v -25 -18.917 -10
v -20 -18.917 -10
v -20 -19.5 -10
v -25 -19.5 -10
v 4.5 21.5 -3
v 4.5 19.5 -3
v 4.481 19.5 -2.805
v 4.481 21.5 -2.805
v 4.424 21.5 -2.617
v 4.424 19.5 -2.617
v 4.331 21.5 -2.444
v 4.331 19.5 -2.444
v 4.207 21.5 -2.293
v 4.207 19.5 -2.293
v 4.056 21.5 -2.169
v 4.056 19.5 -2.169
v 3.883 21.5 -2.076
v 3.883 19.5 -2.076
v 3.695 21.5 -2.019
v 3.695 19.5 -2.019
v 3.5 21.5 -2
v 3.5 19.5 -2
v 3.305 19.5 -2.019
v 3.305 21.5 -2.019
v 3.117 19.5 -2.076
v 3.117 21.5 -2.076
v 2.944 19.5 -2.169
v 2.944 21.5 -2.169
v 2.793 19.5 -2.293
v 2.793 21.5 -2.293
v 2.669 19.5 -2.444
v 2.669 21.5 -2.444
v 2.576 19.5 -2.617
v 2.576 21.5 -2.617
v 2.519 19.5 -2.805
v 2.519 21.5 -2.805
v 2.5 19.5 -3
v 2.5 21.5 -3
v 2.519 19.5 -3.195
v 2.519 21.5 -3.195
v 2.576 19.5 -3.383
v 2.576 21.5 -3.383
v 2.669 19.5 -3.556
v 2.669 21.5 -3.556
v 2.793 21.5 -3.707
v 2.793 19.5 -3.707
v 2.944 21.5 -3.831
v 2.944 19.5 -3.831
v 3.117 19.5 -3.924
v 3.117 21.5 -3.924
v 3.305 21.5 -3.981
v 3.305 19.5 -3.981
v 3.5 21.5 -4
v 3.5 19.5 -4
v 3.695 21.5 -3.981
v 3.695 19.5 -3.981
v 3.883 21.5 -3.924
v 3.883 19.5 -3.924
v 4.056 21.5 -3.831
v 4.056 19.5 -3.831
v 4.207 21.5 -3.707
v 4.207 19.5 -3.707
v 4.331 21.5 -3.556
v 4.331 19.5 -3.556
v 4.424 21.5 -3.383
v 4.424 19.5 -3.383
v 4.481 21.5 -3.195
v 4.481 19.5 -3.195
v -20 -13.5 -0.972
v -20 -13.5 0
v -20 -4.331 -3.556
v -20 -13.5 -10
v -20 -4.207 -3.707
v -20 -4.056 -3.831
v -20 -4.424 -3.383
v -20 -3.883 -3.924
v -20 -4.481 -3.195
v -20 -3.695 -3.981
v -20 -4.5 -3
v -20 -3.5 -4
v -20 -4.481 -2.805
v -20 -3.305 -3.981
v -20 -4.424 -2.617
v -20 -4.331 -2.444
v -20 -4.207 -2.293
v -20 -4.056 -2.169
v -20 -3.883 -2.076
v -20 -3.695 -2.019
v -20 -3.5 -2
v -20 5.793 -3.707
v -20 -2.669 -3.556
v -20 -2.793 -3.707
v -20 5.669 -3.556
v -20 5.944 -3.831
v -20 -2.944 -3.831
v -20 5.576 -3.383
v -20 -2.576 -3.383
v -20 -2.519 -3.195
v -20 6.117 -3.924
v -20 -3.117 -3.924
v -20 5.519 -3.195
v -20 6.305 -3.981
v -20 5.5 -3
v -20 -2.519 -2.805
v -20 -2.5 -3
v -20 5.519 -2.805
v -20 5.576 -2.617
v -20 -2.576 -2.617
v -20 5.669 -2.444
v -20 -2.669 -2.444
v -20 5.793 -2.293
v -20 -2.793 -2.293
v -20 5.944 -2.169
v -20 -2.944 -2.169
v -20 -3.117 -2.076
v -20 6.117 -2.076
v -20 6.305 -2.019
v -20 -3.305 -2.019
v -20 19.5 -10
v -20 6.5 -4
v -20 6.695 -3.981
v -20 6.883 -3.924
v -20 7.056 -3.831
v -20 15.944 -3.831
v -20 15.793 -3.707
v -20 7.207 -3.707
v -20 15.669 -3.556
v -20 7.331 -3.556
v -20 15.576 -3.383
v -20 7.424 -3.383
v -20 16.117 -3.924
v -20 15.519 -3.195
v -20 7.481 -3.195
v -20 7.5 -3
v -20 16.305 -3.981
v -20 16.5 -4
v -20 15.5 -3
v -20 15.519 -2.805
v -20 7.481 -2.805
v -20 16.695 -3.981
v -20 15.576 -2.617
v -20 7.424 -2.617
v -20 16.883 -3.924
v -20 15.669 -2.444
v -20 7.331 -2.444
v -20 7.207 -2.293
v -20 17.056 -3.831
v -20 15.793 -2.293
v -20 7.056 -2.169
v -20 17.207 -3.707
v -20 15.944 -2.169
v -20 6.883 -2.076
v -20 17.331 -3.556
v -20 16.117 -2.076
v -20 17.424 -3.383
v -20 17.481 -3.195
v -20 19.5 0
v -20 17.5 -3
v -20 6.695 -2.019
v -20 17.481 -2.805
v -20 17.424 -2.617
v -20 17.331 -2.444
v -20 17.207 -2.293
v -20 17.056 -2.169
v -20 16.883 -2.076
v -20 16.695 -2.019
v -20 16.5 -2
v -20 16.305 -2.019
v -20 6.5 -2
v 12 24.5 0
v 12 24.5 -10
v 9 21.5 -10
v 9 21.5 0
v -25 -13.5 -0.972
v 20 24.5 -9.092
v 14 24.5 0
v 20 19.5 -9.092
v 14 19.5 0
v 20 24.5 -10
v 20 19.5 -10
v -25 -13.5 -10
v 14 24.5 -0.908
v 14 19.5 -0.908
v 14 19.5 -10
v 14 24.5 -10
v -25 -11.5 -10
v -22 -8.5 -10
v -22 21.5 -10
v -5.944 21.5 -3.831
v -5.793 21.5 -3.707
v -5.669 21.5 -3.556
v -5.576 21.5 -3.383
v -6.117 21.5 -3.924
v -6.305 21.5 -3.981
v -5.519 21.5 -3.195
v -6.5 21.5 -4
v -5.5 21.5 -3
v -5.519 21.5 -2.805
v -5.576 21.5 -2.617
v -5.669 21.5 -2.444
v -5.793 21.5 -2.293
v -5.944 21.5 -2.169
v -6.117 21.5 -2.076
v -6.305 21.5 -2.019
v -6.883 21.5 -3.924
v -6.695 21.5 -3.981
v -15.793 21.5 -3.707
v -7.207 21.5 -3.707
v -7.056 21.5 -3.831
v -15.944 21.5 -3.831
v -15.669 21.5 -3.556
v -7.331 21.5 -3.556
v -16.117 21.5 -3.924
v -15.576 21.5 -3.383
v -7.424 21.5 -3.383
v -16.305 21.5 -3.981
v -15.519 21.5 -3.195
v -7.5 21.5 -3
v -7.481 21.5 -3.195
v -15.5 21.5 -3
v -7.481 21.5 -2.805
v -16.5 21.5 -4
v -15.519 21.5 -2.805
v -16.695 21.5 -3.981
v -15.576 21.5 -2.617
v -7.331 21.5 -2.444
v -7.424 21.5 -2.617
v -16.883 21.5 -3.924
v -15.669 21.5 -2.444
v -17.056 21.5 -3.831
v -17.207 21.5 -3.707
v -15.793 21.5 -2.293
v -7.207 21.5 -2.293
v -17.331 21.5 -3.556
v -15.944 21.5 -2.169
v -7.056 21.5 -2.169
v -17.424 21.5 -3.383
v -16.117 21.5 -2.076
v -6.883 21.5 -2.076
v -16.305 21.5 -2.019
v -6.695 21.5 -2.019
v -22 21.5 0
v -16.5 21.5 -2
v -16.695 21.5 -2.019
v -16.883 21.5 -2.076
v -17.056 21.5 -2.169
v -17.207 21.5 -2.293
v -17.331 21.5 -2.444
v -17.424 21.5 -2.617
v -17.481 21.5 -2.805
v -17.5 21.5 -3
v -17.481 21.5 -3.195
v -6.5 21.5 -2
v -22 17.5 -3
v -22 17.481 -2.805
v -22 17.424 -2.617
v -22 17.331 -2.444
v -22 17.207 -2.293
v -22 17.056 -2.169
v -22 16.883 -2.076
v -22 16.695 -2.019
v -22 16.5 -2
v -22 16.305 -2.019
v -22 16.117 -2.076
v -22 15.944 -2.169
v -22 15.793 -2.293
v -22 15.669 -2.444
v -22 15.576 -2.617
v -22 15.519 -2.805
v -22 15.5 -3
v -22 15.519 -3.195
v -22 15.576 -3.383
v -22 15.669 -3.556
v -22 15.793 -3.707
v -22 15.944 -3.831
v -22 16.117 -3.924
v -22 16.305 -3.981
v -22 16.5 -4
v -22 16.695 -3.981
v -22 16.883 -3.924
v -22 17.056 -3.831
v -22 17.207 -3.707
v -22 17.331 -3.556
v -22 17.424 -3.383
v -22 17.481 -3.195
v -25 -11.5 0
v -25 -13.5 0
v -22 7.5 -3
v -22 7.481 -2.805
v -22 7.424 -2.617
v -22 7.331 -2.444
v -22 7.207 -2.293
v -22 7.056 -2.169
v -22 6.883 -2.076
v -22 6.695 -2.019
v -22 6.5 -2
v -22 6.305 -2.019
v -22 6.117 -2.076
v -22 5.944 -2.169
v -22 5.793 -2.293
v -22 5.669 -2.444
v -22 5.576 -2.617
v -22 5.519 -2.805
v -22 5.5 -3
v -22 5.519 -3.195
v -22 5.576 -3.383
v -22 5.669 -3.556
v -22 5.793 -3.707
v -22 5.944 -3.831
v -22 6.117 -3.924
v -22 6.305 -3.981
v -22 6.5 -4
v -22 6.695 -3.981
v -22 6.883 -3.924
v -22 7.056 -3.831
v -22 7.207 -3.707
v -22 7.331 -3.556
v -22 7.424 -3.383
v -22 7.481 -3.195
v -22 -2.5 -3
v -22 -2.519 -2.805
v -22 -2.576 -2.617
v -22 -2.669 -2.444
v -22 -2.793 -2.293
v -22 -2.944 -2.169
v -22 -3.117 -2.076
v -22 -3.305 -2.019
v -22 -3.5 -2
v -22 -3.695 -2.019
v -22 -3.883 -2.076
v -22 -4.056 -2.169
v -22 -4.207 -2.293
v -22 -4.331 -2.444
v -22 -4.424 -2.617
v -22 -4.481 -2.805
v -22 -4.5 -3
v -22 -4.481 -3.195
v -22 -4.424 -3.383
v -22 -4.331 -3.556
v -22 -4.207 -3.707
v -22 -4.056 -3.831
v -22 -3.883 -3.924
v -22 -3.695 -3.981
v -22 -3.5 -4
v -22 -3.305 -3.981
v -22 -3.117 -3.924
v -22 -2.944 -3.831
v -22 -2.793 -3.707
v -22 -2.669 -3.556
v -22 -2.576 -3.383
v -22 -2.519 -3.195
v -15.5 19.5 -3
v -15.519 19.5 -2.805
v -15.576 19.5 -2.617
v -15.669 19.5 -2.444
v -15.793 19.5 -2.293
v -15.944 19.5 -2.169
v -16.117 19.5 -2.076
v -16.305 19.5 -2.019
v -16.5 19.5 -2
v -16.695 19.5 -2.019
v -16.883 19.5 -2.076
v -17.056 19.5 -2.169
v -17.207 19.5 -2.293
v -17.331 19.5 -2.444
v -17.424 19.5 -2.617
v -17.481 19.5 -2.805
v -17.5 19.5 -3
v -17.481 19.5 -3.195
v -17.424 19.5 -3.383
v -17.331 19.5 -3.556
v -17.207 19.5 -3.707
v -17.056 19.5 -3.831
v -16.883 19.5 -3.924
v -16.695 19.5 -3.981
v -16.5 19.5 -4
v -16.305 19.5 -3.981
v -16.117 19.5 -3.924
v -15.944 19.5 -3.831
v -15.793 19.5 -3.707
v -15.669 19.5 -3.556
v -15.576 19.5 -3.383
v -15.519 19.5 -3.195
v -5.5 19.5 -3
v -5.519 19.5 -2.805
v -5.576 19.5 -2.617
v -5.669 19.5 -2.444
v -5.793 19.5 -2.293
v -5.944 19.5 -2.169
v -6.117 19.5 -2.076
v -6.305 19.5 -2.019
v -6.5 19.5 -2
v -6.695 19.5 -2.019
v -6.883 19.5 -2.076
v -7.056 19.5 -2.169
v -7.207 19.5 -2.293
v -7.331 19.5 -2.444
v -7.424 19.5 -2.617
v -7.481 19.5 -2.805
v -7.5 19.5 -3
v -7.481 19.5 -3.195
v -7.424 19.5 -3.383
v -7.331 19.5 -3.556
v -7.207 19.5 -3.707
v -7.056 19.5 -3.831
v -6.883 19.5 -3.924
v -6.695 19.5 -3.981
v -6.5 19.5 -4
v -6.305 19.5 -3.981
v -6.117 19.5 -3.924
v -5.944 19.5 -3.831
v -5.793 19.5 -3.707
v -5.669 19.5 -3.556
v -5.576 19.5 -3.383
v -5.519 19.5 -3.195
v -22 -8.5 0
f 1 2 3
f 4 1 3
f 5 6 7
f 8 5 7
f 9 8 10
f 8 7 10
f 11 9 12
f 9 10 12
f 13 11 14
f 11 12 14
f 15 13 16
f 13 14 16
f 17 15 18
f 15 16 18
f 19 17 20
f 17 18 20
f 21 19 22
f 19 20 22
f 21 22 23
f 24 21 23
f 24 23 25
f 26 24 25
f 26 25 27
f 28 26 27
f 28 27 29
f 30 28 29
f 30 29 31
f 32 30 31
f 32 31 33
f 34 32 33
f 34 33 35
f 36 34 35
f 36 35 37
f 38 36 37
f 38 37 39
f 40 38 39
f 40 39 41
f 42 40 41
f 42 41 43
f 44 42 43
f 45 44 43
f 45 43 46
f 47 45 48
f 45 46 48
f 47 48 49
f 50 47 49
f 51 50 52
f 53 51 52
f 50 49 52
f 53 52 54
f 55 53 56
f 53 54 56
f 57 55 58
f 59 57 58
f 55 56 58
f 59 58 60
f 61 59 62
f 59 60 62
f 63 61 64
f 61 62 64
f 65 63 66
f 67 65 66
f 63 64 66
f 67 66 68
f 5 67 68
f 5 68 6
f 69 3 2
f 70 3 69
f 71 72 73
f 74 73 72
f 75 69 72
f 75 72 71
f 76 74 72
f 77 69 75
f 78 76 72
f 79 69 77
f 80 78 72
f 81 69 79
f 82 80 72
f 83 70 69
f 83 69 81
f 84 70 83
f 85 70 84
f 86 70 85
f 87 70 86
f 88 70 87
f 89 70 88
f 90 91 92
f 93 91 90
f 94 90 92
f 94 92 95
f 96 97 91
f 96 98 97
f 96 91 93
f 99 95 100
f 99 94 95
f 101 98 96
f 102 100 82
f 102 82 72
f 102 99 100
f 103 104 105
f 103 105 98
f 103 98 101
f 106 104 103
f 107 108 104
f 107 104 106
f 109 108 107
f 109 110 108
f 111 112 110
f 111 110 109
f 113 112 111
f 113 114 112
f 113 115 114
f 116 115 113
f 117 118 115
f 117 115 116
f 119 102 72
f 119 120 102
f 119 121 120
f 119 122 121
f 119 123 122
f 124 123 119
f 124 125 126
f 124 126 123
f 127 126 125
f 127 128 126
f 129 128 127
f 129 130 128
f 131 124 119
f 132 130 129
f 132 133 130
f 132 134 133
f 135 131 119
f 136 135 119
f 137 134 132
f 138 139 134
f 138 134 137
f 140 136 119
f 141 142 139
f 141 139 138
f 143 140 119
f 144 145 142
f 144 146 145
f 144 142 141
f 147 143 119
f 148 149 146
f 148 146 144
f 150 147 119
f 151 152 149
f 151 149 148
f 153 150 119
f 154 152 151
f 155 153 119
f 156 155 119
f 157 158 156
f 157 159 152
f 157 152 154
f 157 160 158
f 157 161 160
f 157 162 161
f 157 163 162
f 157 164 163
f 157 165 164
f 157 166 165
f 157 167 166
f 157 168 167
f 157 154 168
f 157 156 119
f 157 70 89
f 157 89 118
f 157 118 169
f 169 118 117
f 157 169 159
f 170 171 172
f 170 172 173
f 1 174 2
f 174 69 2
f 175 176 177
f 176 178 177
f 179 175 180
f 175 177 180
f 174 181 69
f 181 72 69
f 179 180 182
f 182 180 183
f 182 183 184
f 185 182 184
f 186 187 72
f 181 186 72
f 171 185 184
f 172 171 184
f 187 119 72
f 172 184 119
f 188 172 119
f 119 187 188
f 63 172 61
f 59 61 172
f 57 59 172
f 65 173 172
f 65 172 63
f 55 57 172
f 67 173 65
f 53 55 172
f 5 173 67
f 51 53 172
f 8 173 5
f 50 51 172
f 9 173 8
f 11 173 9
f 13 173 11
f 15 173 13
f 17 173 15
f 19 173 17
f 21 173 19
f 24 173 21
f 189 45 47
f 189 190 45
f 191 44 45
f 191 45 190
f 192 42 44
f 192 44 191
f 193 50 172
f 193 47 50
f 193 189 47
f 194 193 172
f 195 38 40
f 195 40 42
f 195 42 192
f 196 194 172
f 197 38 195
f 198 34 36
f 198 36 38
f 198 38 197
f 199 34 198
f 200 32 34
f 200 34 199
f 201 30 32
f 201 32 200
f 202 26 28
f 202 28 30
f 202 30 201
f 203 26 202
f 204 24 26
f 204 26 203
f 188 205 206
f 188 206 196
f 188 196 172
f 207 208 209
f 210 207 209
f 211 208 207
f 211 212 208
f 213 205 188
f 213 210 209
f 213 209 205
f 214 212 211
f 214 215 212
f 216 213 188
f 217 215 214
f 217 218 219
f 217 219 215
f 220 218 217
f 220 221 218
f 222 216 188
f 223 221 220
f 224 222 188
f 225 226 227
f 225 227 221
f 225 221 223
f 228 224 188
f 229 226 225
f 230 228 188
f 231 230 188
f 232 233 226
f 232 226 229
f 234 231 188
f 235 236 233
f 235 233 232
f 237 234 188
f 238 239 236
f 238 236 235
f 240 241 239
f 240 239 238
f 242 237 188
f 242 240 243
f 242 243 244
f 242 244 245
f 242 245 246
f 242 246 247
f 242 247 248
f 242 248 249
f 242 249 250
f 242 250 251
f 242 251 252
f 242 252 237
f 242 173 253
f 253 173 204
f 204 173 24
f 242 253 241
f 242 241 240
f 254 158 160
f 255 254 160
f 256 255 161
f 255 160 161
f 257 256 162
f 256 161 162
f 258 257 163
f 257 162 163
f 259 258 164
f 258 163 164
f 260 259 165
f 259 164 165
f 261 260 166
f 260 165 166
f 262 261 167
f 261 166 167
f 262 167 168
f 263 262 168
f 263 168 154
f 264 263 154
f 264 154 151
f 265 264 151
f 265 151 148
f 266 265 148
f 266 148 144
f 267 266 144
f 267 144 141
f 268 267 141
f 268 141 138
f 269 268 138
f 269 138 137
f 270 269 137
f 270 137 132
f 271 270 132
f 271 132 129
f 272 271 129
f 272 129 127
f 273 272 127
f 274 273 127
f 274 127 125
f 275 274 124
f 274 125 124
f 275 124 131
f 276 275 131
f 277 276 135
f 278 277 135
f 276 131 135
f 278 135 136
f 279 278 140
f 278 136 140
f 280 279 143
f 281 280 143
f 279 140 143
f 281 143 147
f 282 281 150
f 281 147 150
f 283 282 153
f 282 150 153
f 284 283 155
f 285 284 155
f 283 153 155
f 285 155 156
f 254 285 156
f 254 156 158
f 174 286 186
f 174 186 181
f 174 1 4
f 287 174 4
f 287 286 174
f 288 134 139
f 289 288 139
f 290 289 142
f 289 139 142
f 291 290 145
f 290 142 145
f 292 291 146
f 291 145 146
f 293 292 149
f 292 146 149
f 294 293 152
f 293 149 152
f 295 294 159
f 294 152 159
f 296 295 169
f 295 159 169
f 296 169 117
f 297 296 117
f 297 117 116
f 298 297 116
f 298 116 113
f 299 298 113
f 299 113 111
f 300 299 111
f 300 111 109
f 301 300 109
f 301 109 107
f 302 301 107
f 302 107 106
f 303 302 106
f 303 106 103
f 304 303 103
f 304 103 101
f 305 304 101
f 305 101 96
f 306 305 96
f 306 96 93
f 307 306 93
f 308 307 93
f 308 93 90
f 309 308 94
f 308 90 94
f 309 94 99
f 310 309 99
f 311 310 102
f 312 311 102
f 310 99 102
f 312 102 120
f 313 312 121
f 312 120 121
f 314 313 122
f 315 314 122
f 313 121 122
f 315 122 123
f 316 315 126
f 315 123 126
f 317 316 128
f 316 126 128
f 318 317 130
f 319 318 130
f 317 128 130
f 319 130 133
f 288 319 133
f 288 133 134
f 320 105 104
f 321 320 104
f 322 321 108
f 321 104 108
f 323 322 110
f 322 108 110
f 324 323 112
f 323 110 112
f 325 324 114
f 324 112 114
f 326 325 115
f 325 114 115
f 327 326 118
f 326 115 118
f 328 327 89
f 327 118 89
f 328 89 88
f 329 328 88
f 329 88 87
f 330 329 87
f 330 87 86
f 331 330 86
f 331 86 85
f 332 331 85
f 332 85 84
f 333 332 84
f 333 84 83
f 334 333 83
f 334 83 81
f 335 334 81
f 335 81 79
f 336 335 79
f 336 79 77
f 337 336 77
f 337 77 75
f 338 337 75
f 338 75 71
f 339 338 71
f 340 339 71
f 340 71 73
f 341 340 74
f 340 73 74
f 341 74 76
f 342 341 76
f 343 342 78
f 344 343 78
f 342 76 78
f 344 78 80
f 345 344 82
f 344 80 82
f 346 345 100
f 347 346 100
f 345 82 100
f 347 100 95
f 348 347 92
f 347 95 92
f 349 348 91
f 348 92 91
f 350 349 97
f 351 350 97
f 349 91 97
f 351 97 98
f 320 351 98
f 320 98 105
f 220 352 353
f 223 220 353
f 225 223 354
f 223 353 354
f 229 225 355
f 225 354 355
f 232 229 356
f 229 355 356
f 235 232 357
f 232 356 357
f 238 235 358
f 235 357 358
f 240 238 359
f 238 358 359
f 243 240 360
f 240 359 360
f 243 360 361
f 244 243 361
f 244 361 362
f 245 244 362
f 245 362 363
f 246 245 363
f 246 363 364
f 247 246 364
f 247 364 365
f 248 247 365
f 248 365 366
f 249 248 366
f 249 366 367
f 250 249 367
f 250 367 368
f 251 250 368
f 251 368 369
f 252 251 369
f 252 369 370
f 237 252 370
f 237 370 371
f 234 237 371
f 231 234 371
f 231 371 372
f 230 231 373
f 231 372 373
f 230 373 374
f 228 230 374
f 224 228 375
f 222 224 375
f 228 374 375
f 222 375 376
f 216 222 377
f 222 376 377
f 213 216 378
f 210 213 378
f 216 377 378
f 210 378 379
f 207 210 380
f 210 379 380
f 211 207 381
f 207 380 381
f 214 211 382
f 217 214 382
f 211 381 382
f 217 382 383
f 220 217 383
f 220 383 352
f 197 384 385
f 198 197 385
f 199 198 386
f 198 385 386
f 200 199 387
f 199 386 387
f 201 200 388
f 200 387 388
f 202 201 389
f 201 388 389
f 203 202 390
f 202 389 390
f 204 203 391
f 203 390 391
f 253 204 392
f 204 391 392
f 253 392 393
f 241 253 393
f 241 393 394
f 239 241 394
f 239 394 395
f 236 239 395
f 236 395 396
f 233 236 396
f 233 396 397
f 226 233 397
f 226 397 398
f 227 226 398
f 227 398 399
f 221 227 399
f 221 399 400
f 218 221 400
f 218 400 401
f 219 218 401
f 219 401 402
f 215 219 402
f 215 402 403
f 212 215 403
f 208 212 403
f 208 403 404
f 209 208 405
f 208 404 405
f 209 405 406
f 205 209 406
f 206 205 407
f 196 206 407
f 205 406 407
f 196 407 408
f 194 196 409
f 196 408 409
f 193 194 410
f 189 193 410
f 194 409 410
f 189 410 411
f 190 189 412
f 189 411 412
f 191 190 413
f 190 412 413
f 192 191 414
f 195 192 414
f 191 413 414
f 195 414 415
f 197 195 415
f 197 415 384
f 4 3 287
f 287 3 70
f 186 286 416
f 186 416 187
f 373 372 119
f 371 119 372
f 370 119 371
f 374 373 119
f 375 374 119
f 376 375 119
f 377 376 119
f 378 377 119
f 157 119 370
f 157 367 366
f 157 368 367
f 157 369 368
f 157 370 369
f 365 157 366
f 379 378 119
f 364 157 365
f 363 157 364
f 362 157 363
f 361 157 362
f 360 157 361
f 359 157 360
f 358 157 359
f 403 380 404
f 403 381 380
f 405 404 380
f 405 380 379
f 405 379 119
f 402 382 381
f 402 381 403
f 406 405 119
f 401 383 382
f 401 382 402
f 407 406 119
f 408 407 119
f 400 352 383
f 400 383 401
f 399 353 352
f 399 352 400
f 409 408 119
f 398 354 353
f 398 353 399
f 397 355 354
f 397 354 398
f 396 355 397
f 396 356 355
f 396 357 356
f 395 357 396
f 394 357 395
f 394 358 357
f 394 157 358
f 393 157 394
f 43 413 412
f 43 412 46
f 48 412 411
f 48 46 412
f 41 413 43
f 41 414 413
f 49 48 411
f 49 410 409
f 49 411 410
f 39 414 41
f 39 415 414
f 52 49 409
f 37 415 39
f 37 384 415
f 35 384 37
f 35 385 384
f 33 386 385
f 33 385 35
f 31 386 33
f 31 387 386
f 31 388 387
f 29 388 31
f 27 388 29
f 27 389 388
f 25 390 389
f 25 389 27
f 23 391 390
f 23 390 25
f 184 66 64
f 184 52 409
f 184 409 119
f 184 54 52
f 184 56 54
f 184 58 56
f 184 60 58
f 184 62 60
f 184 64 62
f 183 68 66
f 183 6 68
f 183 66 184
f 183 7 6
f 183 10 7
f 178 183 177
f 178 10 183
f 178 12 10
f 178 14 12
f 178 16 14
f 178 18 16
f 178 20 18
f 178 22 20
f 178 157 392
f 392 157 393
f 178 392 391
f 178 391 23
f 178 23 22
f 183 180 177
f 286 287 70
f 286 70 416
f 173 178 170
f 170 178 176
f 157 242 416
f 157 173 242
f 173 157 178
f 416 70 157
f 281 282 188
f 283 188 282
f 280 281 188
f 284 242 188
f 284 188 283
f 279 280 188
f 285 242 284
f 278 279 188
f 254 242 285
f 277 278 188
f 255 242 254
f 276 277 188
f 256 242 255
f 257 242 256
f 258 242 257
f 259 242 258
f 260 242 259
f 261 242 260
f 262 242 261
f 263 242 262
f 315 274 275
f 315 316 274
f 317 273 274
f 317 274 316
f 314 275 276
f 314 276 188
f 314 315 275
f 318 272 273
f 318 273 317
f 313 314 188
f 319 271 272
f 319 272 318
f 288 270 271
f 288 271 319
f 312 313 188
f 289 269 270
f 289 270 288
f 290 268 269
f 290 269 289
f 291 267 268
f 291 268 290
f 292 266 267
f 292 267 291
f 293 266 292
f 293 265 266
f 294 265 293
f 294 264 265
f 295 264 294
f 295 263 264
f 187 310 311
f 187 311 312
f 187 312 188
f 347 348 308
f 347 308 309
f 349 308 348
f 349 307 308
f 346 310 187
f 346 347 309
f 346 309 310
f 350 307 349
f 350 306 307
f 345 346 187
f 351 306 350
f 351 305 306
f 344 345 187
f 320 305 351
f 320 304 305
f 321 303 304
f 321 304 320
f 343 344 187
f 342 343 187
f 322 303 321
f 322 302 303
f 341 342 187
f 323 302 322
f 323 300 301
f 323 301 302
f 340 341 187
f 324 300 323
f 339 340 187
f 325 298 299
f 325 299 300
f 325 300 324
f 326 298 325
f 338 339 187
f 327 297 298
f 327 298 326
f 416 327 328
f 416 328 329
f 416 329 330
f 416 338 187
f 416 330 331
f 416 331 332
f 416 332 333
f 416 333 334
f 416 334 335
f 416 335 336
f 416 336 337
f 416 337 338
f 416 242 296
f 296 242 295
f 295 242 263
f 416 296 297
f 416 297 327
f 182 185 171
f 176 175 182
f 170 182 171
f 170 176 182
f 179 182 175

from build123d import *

# Parameters (mm, degrees)
F1_DEPTH  = 10
F2_W      = 2
F2_H      = 10
F3_DEPTH  = 25
F4_DEPTH  = 44.001
F6_DEPTH  = 41.001
F9_DEPTH  = 3
F10_SIZE  = 2.99999
F12_DEPTH = 3
F13_SIZE  = 2.99999
F16_D     = 2
F17_D     = 2


# Not quite as in the source:
# - a fillet or chamfer is up to 0.001 mm smaller than in the source, because OpenCascade refuses the exact size
# - a feature of the source that left no trace in its solid (it failed there, or was rolled back) is left out


with BuildPart() as f1:
    # F0 (on Top) → F1 (new body)
    with BuildSketch(Plane.XY):
        Polygon((-22, -19.5), (-20, -19.5), (-20, 19.5), (20, 19.5), (20, 21.5), (-22, 21.5), align=None)
        Polygon((20, 19.5), (20, -19.5), (-20, -19.5), (-22, -19.5), (-22, -21.5), (22, -21.5), (22, 21.5), (20, 21.5), align=None)
    extrude(amount=-F1_DEPTH)

    # F2 (on face) → F3 (cut)
    with BuildSketch(Plane(origin=(-22, 0, 0), x_dir=(0, -1, 0), z_dir=(-1, 0, 0))):
        with Locations((20.5, -5)):
            Rectangle(F2_W, F2_H)
        Polygon((13.5, -10), (18.9169048105, -10), (13.5, -0.9718253158), align=None)
    extrude(amount=-F3_DEPTH, mode=Mode.SUBTRACT)

    # F2 (on face) → F4 (cut, through all)
    with BuildSketch(Plane(origin=(-22, 0, 0), x_dir=(0, -1, 0), z_dir=(-1, 0, 0))):
        Polygon((19.5, 0), (13.5, 0), (19.5, -10), align=None)
        with Locations((20.5, -5)):
            Rectangle(F2_W, F2_H)
    extrude(amount=-F4_DEPTH, mode=Mode.SUBTRACT)

    # F5 (on face) → F6 (cut, through all)
    with BuildSketch(Plane(origin=(0, 21.5, 0), x_dir=(-1, 0, 0), z_dir=(0, 1, 0))):
        Polygon((-14, -0.9077913453), (-20, -10), (-14, -10), align=None)
        Polygon((-22, -10), (-20, -10), (-20, -9.0922086547), (-14, 0), (-22, 0), align=None)
    extrude(amount=-F6_DEPTH, mode=Mode.SUBTRACT)

    # F8 (on face) → F9 (join)
    with BuildSketch(Plane(origin=(0, 21.5, 0), x_dir=(-1, 0, 0), z_dir=(0, 1, 0))):
        Polygon((-14, -10), (-9, -10), (-9, 0), (-14, 0), (-20, -9.0922086547), (-20, -10), (-14, -0.9077913453), align=None)
    extrude(amount=F9_DEPTH)

    # F10 (size 3 in the source; OpenCascade refuses exactly that, so slightly less here)
    f10_edges = [f1.edges().sort_by_distance(p)[0] for p in [
        (9, 24.5, -5),
    ]]
    chamfer(f10_edges, length=F10_SIZE)

    # F11 (on face) → F12 (join)
    with BuildSketch(Plane(origin=(-22, 0, 0), x_dir=(0, -1, 0), z_dir=(-1, 0, 0))):
        Polygon((13.5, 0), (8.5, 0), (8.5, -10), (13.5, -10), (13.5, -0.9718253158), (18.9169048105, -10), (19.5, -10), align=None)
    extrude(amount=F12_DEPTH)

    # F13 (size 3 in the source; OpenCascade refuses exactly that, so slightly less here)
    f13_edges = [f1.edges().sort_by_distance(p)[0] for p in [
        (-25, -8.5, -5),
    ]]
    chamfer(f13_edges, length=F13_SIZE)

    # F16 (through all)
    with Locations(Plane(origin=(-22, 0, 0), x_dir=(0, -1, 0), z_dir=(-1, 0, 0))):
        with Locations((-6.5, -3), (3.5, -3), (-16.5, -3)):
            Hole(F16_D / 2)

    # F17 (through all)
    with Locations(Plane(origin=(0, 21.5, 0), x_dir=(-1, 0, 0), z_dir=(0, 1, 0))):
        with Locations((-3.5, -3), (6.5, -3), (16.5, -3)):
            Hole(F17_D / 2)


solid = f1.part
